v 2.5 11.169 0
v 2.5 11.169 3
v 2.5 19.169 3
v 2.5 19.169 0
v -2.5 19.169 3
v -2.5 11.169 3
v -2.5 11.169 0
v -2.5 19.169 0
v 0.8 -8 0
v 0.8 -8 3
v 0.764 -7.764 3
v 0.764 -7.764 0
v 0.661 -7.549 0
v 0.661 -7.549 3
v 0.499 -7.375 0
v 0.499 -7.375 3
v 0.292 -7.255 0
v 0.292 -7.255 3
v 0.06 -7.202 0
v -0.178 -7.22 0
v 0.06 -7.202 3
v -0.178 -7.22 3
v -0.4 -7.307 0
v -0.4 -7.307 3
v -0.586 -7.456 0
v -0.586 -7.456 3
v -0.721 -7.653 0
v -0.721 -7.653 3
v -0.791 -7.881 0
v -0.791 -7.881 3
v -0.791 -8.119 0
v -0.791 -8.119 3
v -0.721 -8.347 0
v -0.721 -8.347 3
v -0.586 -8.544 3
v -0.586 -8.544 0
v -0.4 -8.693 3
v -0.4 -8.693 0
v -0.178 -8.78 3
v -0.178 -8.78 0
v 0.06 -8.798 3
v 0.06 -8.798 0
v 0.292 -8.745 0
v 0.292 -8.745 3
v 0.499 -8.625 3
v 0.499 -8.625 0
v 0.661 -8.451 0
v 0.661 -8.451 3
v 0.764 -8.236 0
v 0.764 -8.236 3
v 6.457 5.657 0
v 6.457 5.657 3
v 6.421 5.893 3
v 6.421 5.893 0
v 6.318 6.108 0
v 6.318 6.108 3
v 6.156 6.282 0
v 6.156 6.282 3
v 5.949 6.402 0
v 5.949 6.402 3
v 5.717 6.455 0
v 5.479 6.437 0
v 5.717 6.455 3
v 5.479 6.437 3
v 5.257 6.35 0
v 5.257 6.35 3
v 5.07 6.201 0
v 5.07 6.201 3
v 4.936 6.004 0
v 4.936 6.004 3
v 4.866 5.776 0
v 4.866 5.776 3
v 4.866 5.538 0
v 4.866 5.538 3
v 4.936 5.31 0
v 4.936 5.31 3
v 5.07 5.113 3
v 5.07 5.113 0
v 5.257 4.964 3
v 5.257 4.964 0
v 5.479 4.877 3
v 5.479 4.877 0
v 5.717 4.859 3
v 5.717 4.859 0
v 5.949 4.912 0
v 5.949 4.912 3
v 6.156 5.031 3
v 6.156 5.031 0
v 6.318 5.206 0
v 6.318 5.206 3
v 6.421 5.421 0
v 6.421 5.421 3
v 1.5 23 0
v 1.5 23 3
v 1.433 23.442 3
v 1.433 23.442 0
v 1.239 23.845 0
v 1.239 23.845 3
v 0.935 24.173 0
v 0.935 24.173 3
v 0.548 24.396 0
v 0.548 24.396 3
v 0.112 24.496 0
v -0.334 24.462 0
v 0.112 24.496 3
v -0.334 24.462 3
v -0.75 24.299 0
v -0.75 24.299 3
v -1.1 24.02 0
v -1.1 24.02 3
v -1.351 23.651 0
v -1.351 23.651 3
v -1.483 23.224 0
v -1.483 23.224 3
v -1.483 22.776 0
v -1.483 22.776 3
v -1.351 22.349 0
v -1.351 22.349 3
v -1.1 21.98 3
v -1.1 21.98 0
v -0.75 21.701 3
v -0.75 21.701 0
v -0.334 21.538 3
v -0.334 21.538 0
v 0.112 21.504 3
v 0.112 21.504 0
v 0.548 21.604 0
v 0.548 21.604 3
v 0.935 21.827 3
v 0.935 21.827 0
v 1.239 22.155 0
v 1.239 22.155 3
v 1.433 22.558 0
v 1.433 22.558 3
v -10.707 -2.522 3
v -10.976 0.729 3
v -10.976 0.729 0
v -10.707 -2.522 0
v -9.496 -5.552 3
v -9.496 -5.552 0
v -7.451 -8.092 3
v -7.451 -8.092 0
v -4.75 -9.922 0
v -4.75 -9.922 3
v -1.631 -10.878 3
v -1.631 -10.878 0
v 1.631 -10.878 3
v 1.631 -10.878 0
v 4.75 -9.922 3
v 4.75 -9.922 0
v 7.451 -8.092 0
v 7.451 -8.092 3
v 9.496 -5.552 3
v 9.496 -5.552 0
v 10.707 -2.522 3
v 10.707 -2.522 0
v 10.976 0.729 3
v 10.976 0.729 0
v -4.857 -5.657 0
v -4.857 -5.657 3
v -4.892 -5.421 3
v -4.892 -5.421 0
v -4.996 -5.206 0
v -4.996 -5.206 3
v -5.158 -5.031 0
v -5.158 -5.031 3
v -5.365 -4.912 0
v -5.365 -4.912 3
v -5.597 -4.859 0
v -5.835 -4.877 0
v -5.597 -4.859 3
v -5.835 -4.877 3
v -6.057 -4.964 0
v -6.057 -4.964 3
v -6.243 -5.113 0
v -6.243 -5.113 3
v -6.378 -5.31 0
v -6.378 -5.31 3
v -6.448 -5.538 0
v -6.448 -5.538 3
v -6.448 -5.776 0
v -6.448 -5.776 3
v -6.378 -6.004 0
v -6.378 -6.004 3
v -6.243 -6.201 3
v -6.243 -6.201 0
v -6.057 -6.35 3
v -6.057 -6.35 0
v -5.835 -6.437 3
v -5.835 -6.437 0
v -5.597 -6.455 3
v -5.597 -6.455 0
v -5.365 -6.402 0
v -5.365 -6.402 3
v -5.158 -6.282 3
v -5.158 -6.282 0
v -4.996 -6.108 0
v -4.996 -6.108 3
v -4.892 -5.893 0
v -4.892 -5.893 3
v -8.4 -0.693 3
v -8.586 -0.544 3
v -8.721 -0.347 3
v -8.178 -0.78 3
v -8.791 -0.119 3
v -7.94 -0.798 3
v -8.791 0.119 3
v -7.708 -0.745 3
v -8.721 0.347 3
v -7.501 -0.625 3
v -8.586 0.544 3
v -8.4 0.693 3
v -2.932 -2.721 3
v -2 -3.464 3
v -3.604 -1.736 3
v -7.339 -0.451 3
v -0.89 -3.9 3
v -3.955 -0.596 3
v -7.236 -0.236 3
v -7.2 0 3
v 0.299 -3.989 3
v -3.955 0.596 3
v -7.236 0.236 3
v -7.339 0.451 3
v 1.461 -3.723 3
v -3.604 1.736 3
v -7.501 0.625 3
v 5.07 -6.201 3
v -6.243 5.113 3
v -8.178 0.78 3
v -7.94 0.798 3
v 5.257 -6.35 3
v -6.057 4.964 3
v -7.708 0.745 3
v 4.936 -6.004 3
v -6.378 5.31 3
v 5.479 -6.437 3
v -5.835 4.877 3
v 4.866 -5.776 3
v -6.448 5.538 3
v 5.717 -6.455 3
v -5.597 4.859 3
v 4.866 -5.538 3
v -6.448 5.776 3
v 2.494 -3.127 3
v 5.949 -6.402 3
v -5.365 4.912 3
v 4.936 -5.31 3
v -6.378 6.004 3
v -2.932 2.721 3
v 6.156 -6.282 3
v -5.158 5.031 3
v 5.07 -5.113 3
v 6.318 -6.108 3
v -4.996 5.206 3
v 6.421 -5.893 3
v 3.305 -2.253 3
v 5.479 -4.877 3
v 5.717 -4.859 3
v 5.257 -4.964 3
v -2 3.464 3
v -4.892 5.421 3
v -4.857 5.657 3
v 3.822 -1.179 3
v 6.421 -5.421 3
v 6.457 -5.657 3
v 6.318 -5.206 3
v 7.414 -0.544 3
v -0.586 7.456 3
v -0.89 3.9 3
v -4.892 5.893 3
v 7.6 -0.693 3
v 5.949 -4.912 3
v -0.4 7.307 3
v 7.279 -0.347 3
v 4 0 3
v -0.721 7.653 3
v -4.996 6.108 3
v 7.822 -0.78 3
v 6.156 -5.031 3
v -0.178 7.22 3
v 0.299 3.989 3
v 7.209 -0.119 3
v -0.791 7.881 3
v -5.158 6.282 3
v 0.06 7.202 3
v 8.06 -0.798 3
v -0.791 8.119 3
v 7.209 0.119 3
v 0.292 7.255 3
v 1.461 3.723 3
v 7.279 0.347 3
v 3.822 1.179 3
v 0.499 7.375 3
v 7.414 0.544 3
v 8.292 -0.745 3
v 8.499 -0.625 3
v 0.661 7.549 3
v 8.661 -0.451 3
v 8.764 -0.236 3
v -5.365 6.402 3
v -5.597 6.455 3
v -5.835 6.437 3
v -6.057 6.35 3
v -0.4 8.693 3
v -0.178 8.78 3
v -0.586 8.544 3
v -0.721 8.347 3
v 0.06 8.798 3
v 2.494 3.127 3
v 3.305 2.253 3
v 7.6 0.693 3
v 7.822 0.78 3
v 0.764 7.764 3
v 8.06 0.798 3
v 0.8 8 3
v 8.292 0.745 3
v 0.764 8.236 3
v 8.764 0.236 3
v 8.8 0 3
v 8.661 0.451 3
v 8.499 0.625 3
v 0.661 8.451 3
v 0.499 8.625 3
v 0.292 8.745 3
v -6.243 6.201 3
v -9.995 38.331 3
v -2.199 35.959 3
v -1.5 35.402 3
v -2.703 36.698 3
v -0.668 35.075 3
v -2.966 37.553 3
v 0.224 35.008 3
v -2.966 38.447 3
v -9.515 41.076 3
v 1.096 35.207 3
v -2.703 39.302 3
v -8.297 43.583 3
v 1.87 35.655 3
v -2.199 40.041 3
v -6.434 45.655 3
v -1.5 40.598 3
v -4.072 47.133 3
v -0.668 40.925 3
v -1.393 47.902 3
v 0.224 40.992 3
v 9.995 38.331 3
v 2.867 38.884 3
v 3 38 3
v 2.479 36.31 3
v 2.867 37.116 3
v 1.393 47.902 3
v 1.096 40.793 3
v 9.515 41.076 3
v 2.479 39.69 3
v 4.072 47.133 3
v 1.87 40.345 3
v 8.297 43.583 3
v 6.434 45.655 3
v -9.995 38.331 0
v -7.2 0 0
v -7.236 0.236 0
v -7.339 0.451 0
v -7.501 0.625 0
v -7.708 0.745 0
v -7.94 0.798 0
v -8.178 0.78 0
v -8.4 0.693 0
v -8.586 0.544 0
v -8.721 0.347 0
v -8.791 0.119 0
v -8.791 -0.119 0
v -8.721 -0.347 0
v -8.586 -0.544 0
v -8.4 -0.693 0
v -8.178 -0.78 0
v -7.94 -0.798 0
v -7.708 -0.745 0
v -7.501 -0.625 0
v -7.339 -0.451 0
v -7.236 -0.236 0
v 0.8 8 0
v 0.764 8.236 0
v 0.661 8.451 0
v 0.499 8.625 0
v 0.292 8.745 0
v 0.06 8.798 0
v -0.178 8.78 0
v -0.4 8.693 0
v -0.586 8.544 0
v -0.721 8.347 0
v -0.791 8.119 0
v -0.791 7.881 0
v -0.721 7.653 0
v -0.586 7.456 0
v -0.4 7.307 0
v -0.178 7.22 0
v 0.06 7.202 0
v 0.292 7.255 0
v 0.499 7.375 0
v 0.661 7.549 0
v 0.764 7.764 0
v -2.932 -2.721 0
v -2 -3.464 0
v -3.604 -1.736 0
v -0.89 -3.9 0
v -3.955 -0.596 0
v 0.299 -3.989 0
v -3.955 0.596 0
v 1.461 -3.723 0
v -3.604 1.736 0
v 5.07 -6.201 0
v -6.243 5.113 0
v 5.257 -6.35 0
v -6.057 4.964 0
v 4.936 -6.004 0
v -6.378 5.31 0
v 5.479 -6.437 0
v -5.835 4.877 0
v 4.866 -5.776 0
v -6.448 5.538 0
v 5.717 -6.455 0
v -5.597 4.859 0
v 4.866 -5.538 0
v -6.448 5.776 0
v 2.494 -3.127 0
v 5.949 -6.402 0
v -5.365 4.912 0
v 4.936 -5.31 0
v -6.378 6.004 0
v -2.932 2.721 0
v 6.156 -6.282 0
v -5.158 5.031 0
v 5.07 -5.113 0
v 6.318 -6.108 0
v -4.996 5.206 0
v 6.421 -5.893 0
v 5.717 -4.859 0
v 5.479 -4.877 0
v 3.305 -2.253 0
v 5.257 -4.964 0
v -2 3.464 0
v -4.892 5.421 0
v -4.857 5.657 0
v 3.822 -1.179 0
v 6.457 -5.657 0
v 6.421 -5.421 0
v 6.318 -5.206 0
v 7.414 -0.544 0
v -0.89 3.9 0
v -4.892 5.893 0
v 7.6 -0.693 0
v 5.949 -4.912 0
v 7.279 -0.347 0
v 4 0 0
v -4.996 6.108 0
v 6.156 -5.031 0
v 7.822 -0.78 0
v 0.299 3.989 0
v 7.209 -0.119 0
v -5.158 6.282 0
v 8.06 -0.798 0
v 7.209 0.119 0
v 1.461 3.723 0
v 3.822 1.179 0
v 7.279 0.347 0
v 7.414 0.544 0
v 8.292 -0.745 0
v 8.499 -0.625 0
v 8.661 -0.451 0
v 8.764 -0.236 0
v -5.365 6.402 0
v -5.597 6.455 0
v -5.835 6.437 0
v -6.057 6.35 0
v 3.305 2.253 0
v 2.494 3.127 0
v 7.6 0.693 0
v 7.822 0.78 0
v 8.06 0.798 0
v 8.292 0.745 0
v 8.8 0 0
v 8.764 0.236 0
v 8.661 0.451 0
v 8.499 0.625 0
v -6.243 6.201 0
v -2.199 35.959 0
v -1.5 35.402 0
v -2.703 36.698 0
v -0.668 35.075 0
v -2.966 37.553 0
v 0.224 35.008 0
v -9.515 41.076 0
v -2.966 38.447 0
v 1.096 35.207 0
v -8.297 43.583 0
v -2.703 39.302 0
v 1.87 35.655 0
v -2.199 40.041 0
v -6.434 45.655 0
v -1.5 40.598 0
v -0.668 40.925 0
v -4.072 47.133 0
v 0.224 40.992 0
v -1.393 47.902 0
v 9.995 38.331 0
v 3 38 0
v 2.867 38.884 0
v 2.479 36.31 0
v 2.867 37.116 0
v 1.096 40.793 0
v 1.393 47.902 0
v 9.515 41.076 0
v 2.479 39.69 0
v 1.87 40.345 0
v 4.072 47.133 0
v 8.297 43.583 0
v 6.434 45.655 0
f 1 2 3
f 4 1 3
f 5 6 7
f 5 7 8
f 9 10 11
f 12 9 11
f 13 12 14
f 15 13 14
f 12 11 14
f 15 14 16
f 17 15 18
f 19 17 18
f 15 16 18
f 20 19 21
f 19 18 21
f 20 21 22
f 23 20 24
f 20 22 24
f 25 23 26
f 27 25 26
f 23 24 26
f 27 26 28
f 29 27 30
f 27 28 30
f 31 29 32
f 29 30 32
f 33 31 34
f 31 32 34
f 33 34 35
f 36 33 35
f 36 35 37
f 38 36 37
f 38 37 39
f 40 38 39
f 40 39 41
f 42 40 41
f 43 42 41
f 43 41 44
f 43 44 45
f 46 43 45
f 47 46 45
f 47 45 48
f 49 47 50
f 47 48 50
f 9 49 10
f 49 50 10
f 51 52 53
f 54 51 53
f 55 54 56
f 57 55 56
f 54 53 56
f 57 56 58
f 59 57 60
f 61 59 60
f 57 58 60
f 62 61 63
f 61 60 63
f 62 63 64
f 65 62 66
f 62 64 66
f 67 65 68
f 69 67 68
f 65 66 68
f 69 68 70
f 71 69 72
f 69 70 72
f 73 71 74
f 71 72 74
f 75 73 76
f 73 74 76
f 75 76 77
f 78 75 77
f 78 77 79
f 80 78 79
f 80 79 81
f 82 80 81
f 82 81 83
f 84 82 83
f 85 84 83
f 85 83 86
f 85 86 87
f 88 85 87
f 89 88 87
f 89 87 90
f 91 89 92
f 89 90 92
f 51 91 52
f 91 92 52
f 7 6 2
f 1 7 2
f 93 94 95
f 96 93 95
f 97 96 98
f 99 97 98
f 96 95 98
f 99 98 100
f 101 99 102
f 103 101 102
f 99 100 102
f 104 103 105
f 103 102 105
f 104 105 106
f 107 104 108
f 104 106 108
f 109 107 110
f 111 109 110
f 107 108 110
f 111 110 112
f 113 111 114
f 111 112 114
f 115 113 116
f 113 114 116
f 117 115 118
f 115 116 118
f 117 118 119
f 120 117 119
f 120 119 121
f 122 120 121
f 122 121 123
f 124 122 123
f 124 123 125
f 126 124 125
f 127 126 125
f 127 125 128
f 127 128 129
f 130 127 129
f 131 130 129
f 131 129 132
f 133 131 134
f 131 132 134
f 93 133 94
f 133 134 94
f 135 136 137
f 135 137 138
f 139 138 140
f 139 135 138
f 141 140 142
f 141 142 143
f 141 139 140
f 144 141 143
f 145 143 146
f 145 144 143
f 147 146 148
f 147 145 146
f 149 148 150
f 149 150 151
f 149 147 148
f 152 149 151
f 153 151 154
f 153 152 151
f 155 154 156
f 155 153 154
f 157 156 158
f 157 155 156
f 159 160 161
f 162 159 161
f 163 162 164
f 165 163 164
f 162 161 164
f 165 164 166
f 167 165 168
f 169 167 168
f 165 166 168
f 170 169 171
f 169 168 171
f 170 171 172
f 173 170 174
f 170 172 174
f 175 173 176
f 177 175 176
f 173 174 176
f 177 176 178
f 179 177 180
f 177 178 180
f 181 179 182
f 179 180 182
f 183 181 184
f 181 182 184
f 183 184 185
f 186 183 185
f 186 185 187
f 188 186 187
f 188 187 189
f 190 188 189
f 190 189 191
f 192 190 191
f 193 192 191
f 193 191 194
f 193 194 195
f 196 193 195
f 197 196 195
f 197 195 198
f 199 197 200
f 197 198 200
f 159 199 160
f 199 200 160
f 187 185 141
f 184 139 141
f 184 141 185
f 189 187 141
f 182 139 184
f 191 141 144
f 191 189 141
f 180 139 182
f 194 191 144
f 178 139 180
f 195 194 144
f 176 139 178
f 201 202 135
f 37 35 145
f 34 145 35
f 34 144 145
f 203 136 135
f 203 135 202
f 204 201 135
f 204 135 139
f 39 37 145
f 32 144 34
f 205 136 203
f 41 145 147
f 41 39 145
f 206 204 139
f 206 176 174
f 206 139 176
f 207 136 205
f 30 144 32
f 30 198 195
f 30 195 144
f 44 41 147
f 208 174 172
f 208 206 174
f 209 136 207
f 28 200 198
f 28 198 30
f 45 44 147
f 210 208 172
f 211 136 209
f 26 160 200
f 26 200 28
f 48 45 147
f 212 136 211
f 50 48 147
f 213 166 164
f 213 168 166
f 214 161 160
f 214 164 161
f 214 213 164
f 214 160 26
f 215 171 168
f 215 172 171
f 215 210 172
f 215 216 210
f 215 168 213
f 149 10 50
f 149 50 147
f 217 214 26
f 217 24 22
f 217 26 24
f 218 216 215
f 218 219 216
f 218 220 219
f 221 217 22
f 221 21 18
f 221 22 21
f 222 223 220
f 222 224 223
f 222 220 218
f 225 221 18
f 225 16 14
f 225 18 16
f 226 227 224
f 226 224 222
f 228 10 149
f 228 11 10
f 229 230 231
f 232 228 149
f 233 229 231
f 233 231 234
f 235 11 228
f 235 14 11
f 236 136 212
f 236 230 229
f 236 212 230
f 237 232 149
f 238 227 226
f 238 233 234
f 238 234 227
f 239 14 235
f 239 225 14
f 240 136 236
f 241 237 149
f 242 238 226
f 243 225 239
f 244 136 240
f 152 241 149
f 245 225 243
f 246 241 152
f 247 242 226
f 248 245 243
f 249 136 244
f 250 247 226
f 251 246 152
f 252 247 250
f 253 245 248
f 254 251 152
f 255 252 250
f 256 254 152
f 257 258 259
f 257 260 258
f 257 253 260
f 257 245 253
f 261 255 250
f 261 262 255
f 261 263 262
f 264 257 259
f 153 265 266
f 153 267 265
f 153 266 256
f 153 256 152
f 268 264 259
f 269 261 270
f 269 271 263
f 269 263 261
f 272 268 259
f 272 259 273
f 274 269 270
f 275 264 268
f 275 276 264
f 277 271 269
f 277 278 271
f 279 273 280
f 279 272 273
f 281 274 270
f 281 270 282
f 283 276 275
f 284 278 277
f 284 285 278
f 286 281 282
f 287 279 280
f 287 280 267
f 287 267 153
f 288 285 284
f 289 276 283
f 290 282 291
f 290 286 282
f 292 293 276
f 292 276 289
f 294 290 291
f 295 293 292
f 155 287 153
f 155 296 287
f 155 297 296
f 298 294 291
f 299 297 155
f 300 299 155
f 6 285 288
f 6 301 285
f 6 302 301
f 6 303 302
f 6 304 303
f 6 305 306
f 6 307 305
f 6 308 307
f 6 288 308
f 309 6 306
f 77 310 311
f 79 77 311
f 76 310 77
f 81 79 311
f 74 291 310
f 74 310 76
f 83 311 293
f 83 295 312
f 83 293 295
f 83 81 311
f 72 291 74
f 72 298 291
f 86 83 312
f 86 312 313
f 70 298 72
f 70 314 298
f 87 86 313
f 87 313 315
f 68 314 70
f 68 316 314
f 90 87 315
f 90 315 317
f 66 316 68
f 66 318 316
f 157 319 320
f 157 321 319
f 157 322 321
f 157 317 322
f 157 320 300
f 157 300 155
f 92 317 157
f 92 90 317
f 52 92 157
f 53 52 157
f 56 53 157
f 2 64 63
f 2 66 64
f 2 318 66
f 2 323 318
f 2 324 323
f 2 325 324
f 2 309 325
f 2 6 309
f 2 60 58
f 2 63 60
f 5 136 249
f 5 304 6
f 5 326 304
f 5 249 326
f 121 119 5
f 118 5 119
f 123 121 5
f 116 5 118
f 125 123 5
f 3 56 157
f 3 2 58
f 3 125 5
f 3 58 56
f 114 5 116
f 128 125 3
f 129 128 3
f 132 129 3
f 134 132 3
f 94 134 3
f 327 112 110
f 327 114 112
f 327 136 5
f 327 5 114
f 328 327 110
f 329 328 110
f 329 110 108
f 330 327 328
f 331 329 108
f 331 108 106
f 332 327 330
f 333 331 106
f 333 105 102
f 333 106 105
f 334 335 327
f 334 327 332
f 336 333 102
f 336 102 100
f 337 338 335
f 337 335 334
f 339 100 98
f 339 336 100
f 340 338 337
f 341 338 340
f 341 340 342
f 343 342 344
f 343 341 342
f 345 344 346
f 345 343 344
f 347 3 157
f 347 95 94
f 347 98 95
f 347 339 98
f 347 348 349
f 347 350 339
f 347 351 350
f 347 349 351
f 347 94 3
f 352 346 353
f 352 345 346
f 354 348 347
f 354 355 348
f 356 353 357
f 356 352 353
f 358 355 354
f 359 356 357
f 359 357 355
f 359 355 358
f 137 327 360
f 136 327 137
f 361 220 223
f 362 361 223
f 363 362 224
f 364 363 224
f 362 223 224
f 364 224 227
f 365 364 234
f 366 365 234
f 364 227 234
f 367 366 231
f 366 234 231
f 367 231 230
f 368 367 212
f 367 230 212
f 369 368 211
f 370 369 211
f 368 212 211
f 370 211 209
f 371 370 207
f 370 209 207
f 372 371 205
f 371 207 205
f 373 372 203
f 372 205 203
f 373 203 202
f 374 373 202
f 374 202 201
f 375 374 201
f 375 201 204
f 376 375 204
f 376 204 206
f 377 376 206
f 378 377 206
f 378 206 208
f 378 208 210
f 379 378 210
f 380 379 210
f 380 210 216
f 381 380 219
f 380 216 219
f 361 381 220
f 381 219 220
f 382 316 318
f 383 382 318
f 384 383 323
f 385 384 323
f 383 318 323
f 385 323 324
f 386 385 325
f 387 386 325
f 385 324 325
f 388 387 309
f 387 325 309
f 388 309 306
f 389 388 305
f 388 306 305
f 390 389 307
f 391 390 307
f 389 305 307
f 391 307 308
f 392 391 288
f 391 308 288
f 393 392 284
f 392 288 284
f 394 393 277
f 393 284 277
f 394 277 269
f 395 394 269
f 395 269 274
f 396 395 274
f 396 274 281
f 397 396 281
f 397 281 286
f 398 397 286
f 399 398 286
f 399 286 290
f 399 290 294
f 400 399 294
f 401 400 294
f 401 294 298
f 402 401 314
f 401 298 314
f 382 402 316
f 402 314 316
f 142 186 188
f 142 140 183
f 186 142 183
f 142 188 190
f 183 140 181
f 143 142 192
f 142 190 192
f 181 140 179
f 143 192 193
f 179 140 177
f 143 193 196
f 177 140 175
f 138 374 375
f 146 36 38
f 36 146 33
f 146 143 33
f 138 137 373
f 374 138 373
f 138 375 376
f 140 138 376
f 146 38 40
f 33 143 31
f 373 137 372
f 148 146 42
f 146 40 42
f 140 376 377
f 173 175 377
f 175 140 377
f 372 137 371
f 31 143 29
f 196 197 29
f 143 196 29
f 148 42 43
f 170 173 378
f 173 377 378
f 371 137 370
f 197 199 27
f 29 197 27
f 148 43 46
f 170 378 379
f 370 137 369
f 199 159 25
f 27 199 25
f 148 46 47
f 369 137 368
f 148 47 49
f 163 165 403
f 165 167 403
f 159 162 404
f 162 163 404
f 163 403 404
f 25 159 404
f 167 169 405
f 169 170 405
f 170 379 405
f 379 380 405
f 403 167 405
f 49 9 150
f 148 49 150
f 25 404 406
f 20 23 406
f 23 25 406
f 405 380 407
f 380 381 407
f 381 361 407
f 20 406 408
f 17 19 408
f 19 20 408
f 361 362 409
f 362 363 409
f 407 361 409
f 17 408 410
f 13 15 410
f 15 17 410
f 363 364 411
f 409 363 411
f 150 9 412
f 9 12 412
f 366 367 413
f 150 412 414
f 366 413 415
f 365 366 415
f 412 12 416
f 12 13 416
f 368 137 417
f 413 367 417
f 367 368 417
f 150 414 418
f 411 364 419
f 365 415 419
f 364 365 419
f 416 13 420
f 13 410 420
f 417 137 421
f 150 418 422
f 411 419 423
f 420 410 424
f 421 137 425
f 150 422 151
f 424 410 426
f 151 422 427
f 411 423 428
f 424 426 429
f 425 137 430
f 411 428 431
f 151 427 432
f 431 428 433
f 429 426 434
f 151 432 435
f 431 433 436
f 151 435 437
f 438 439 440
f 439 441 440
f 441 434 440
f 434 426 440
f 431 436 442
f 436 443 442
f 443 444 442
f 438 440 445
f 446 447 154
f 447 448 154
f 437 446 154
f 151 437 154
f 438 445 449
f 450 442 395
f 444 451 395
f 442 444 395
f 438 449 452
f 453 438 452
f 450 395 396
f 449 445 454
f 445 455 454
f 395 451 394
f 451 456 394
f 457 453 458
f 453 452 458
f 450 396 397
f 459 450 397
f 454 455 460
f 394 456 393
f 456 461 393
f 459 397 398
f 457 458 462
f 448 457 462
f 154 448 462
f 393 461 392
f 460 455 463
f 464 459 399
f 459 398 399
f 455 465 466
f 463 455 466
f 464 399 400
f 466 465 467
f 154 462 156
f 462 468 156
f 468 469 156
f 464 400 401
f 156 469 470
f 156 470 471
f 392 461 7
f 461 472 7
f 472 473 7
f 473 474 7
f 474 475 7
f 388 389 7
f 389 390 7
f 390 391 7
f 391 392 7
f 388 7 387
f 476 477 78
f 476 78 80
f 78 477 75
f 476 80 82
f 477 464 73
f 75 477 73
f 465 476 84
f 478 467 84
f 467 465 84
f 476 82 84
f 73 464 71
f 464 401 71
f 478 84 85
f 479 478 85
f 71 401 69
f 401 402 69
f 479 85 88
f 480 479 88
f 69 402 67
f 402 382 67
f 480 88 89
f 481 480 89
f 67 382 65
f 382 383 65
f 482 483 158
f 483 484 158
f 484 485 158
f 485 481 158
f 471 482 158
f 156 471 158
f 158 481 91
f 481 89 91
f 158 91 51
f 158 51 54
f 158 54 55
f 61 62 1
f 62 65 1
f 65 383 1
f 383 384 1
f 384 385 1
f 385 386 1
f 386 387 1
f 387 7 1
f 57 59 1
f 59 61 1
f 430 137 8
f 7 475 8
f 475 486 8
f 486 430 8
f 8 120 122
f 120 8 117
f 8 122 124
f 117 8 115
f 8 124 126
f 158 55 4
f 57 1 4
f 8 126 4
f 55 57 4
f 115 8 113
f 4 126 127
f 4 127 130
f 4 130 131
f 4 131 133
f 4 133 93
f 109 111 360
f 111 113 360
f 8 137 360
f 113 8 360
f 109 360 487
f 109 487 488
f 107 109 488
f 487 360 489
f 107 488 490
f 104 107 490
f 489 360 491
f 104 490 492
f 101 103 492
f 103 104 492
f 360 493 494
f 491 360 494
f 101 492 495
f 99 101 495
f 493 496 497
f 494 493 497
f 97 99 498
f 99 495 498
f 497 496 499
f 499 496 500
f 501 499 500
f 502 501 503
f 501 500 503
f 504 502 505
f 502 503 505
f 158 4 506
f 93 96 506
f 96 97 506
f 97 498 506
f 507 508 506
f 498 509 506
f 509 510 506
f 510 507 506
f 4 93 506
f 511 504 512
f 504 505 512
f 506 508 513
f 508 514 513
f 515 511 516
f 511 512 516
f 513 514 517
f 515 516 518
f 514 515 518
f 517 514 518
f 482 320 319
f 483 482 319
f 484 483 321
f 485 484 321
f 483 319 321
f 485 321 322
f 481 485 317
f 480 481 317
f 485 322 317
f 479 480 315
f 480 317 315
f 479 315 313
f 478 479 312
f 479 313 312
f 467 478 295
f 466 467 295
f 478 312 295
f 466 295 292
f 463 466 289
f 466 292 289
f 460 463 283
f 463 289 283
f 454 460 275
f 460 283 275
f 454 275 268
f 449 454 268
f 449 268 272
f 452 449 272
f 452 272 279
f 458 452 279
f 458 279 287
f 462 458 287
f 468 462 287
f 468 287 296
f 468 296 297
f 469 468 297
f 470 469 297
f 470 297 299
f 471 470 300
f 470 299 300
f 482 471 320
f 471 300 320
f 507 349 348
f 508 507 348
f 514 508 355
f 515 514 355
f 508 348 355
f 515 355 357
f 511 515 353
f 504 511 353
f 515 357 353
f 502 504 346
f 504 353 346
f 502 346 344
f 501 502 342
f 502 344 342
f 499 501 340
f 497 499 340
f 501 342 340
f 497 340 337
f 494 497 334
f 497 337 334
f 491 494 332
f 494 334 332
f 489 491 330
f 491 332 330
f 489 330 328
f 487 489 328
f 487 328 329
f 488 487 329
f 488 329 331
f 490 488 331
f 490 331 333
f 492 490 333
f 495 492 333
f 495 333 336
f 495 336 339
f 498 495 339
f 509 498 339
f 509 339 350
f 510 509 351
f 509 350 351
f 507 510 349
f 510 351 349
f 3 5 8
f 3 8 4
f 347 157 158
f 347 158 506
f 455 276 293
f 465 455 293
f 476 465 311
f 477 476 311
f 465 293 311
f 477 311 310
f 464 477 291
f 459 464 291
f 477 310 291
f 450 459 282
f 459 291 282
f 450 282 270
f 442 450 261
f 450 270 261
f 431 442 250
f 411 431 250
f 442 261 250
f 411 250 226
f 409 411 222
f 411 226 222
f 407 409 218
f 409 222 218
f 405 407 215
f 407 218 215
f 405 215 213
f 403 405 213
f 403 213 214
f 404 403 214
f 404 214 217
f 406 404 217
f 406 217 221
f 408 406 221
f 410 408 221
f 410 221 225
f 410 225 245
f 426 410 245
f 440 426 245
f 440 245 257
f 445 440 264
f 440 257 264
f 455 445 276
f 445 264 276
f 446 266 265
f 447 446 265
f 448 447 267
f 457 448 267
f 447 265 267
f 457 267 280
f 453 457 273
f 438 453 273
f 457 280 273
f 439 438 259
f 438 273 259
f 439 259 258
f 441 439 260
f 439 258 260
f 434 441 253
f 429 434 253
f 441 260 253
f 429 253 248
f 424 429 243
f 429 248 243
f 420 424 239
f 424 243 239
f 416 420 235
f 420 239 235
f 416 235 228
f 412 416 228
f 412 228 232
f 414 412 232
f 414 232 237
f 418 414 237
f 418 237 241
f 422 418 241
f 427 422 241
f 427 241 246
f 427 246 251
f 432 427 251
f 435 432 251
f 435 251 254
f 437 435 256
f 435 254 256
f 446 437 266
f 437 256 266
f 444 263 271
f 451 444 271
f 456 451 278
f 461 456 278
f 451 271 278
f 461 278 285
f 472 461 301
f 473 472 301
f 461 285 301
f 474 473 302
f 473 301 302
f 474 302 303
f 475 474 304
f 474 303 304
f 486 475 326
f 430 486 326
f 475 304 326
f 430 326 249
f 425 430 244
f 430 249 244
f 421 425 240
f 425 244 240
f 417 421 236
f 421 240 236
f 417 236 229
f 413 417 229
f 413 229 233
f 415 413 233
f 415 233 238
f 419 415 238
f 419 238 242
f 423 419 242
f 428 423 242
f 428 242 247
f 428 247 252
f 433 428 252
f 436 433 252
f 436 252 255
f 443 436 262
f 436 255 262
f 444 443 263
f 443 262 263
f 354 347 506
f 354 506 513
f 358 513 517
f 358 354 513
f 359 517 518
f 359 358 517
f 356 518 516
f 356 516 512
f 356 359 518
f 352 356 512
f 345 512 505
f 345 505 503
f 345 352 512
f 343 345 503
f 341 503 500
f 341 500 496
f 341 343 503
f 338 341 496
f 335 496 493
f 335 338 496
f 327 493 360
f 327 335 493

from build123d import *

# Parameters (mm, degrees)
IZIM1_R                     = 0.8
IZIM1_R_2                   = 3
IZIM1_R_3                   = 4
IZIM1_R_4                   = 1.5
IZIM1_W                     = 5
IZIM1_H                     = 8
Y_KSEKLIK_EKSTR_ZYON1_DEPTH = 3


with BuildPart() as part:
    # Çizim1 → Yükseklik-Ekstrüzyon1 (new body)
    with BuildSketch(Plane.XY.offset(3)):
        with BuildLine():
            Line((10.975849913, 0.728504421), (9.994509837, 38.331320273))
            ThreePointArc((9.994509837, 38.331320273), (0, 48), (-9.994509837, 38.331320273))
            Line((-9.994509837, 38.331320273), (-10.975849913, 0.728504421))
            ThreePointArc((-10.975849913, 0.728504421), (0, -11), (10.975849913, 0.728504421))
        make_face()
        with Locations((0, 8)):
            Circle(IZIM1_R, mode=Mode.SUBTRACT)
        with Locations((5.656854249, 5.656854249)):
            Circle(IZIM1_R, mode=Mode.SUBTRACT)
        with Locations((8, 0)):
            Circle(IZIM1_R, mode=Mode.SUBTRACT)
        with Locations((5.656854249, -5.656854249)):
            Circle(IZIM1_R, mode=Mode.SUBTRACT)
        with Locations((0, -8)):
            Circle(IZIM1_R, mode=Mode.SUBTRACT)
        with Locations((-5.656854249, -5.656854249)):
            Circle(IZIM1_R, mode=Mode.SUBTRACT)
        with Locations((-8, 0)):
            Circle(IZIM1_R, mode=Mode.SUBTRACT)
        with Locations((0, 38)):
            Circle(IZIM1_R_2, mode=Mode.SUBTRACT)
        Circle(IZIM1_R_3, mode=Mode.SUBTRACT)
        with Locations((0, 23)):
            Circle(IZIM1_R_4, mode=Mode.SUBTRACT)
        with Locations((-5.656854249, 5.656854249)):
            Circle(IZIM1_R, mode=Mode.SUBTRACT)
        with Locations((0, 15.169050412)):
            Rectangle(IZIM1_W, IZIM1_H, mode=Mode.SUBTRACT)
    extrude(amount=-Y_KSEKLIK_EKSTR_ZYON1_DEPTH)


solid = part.part
